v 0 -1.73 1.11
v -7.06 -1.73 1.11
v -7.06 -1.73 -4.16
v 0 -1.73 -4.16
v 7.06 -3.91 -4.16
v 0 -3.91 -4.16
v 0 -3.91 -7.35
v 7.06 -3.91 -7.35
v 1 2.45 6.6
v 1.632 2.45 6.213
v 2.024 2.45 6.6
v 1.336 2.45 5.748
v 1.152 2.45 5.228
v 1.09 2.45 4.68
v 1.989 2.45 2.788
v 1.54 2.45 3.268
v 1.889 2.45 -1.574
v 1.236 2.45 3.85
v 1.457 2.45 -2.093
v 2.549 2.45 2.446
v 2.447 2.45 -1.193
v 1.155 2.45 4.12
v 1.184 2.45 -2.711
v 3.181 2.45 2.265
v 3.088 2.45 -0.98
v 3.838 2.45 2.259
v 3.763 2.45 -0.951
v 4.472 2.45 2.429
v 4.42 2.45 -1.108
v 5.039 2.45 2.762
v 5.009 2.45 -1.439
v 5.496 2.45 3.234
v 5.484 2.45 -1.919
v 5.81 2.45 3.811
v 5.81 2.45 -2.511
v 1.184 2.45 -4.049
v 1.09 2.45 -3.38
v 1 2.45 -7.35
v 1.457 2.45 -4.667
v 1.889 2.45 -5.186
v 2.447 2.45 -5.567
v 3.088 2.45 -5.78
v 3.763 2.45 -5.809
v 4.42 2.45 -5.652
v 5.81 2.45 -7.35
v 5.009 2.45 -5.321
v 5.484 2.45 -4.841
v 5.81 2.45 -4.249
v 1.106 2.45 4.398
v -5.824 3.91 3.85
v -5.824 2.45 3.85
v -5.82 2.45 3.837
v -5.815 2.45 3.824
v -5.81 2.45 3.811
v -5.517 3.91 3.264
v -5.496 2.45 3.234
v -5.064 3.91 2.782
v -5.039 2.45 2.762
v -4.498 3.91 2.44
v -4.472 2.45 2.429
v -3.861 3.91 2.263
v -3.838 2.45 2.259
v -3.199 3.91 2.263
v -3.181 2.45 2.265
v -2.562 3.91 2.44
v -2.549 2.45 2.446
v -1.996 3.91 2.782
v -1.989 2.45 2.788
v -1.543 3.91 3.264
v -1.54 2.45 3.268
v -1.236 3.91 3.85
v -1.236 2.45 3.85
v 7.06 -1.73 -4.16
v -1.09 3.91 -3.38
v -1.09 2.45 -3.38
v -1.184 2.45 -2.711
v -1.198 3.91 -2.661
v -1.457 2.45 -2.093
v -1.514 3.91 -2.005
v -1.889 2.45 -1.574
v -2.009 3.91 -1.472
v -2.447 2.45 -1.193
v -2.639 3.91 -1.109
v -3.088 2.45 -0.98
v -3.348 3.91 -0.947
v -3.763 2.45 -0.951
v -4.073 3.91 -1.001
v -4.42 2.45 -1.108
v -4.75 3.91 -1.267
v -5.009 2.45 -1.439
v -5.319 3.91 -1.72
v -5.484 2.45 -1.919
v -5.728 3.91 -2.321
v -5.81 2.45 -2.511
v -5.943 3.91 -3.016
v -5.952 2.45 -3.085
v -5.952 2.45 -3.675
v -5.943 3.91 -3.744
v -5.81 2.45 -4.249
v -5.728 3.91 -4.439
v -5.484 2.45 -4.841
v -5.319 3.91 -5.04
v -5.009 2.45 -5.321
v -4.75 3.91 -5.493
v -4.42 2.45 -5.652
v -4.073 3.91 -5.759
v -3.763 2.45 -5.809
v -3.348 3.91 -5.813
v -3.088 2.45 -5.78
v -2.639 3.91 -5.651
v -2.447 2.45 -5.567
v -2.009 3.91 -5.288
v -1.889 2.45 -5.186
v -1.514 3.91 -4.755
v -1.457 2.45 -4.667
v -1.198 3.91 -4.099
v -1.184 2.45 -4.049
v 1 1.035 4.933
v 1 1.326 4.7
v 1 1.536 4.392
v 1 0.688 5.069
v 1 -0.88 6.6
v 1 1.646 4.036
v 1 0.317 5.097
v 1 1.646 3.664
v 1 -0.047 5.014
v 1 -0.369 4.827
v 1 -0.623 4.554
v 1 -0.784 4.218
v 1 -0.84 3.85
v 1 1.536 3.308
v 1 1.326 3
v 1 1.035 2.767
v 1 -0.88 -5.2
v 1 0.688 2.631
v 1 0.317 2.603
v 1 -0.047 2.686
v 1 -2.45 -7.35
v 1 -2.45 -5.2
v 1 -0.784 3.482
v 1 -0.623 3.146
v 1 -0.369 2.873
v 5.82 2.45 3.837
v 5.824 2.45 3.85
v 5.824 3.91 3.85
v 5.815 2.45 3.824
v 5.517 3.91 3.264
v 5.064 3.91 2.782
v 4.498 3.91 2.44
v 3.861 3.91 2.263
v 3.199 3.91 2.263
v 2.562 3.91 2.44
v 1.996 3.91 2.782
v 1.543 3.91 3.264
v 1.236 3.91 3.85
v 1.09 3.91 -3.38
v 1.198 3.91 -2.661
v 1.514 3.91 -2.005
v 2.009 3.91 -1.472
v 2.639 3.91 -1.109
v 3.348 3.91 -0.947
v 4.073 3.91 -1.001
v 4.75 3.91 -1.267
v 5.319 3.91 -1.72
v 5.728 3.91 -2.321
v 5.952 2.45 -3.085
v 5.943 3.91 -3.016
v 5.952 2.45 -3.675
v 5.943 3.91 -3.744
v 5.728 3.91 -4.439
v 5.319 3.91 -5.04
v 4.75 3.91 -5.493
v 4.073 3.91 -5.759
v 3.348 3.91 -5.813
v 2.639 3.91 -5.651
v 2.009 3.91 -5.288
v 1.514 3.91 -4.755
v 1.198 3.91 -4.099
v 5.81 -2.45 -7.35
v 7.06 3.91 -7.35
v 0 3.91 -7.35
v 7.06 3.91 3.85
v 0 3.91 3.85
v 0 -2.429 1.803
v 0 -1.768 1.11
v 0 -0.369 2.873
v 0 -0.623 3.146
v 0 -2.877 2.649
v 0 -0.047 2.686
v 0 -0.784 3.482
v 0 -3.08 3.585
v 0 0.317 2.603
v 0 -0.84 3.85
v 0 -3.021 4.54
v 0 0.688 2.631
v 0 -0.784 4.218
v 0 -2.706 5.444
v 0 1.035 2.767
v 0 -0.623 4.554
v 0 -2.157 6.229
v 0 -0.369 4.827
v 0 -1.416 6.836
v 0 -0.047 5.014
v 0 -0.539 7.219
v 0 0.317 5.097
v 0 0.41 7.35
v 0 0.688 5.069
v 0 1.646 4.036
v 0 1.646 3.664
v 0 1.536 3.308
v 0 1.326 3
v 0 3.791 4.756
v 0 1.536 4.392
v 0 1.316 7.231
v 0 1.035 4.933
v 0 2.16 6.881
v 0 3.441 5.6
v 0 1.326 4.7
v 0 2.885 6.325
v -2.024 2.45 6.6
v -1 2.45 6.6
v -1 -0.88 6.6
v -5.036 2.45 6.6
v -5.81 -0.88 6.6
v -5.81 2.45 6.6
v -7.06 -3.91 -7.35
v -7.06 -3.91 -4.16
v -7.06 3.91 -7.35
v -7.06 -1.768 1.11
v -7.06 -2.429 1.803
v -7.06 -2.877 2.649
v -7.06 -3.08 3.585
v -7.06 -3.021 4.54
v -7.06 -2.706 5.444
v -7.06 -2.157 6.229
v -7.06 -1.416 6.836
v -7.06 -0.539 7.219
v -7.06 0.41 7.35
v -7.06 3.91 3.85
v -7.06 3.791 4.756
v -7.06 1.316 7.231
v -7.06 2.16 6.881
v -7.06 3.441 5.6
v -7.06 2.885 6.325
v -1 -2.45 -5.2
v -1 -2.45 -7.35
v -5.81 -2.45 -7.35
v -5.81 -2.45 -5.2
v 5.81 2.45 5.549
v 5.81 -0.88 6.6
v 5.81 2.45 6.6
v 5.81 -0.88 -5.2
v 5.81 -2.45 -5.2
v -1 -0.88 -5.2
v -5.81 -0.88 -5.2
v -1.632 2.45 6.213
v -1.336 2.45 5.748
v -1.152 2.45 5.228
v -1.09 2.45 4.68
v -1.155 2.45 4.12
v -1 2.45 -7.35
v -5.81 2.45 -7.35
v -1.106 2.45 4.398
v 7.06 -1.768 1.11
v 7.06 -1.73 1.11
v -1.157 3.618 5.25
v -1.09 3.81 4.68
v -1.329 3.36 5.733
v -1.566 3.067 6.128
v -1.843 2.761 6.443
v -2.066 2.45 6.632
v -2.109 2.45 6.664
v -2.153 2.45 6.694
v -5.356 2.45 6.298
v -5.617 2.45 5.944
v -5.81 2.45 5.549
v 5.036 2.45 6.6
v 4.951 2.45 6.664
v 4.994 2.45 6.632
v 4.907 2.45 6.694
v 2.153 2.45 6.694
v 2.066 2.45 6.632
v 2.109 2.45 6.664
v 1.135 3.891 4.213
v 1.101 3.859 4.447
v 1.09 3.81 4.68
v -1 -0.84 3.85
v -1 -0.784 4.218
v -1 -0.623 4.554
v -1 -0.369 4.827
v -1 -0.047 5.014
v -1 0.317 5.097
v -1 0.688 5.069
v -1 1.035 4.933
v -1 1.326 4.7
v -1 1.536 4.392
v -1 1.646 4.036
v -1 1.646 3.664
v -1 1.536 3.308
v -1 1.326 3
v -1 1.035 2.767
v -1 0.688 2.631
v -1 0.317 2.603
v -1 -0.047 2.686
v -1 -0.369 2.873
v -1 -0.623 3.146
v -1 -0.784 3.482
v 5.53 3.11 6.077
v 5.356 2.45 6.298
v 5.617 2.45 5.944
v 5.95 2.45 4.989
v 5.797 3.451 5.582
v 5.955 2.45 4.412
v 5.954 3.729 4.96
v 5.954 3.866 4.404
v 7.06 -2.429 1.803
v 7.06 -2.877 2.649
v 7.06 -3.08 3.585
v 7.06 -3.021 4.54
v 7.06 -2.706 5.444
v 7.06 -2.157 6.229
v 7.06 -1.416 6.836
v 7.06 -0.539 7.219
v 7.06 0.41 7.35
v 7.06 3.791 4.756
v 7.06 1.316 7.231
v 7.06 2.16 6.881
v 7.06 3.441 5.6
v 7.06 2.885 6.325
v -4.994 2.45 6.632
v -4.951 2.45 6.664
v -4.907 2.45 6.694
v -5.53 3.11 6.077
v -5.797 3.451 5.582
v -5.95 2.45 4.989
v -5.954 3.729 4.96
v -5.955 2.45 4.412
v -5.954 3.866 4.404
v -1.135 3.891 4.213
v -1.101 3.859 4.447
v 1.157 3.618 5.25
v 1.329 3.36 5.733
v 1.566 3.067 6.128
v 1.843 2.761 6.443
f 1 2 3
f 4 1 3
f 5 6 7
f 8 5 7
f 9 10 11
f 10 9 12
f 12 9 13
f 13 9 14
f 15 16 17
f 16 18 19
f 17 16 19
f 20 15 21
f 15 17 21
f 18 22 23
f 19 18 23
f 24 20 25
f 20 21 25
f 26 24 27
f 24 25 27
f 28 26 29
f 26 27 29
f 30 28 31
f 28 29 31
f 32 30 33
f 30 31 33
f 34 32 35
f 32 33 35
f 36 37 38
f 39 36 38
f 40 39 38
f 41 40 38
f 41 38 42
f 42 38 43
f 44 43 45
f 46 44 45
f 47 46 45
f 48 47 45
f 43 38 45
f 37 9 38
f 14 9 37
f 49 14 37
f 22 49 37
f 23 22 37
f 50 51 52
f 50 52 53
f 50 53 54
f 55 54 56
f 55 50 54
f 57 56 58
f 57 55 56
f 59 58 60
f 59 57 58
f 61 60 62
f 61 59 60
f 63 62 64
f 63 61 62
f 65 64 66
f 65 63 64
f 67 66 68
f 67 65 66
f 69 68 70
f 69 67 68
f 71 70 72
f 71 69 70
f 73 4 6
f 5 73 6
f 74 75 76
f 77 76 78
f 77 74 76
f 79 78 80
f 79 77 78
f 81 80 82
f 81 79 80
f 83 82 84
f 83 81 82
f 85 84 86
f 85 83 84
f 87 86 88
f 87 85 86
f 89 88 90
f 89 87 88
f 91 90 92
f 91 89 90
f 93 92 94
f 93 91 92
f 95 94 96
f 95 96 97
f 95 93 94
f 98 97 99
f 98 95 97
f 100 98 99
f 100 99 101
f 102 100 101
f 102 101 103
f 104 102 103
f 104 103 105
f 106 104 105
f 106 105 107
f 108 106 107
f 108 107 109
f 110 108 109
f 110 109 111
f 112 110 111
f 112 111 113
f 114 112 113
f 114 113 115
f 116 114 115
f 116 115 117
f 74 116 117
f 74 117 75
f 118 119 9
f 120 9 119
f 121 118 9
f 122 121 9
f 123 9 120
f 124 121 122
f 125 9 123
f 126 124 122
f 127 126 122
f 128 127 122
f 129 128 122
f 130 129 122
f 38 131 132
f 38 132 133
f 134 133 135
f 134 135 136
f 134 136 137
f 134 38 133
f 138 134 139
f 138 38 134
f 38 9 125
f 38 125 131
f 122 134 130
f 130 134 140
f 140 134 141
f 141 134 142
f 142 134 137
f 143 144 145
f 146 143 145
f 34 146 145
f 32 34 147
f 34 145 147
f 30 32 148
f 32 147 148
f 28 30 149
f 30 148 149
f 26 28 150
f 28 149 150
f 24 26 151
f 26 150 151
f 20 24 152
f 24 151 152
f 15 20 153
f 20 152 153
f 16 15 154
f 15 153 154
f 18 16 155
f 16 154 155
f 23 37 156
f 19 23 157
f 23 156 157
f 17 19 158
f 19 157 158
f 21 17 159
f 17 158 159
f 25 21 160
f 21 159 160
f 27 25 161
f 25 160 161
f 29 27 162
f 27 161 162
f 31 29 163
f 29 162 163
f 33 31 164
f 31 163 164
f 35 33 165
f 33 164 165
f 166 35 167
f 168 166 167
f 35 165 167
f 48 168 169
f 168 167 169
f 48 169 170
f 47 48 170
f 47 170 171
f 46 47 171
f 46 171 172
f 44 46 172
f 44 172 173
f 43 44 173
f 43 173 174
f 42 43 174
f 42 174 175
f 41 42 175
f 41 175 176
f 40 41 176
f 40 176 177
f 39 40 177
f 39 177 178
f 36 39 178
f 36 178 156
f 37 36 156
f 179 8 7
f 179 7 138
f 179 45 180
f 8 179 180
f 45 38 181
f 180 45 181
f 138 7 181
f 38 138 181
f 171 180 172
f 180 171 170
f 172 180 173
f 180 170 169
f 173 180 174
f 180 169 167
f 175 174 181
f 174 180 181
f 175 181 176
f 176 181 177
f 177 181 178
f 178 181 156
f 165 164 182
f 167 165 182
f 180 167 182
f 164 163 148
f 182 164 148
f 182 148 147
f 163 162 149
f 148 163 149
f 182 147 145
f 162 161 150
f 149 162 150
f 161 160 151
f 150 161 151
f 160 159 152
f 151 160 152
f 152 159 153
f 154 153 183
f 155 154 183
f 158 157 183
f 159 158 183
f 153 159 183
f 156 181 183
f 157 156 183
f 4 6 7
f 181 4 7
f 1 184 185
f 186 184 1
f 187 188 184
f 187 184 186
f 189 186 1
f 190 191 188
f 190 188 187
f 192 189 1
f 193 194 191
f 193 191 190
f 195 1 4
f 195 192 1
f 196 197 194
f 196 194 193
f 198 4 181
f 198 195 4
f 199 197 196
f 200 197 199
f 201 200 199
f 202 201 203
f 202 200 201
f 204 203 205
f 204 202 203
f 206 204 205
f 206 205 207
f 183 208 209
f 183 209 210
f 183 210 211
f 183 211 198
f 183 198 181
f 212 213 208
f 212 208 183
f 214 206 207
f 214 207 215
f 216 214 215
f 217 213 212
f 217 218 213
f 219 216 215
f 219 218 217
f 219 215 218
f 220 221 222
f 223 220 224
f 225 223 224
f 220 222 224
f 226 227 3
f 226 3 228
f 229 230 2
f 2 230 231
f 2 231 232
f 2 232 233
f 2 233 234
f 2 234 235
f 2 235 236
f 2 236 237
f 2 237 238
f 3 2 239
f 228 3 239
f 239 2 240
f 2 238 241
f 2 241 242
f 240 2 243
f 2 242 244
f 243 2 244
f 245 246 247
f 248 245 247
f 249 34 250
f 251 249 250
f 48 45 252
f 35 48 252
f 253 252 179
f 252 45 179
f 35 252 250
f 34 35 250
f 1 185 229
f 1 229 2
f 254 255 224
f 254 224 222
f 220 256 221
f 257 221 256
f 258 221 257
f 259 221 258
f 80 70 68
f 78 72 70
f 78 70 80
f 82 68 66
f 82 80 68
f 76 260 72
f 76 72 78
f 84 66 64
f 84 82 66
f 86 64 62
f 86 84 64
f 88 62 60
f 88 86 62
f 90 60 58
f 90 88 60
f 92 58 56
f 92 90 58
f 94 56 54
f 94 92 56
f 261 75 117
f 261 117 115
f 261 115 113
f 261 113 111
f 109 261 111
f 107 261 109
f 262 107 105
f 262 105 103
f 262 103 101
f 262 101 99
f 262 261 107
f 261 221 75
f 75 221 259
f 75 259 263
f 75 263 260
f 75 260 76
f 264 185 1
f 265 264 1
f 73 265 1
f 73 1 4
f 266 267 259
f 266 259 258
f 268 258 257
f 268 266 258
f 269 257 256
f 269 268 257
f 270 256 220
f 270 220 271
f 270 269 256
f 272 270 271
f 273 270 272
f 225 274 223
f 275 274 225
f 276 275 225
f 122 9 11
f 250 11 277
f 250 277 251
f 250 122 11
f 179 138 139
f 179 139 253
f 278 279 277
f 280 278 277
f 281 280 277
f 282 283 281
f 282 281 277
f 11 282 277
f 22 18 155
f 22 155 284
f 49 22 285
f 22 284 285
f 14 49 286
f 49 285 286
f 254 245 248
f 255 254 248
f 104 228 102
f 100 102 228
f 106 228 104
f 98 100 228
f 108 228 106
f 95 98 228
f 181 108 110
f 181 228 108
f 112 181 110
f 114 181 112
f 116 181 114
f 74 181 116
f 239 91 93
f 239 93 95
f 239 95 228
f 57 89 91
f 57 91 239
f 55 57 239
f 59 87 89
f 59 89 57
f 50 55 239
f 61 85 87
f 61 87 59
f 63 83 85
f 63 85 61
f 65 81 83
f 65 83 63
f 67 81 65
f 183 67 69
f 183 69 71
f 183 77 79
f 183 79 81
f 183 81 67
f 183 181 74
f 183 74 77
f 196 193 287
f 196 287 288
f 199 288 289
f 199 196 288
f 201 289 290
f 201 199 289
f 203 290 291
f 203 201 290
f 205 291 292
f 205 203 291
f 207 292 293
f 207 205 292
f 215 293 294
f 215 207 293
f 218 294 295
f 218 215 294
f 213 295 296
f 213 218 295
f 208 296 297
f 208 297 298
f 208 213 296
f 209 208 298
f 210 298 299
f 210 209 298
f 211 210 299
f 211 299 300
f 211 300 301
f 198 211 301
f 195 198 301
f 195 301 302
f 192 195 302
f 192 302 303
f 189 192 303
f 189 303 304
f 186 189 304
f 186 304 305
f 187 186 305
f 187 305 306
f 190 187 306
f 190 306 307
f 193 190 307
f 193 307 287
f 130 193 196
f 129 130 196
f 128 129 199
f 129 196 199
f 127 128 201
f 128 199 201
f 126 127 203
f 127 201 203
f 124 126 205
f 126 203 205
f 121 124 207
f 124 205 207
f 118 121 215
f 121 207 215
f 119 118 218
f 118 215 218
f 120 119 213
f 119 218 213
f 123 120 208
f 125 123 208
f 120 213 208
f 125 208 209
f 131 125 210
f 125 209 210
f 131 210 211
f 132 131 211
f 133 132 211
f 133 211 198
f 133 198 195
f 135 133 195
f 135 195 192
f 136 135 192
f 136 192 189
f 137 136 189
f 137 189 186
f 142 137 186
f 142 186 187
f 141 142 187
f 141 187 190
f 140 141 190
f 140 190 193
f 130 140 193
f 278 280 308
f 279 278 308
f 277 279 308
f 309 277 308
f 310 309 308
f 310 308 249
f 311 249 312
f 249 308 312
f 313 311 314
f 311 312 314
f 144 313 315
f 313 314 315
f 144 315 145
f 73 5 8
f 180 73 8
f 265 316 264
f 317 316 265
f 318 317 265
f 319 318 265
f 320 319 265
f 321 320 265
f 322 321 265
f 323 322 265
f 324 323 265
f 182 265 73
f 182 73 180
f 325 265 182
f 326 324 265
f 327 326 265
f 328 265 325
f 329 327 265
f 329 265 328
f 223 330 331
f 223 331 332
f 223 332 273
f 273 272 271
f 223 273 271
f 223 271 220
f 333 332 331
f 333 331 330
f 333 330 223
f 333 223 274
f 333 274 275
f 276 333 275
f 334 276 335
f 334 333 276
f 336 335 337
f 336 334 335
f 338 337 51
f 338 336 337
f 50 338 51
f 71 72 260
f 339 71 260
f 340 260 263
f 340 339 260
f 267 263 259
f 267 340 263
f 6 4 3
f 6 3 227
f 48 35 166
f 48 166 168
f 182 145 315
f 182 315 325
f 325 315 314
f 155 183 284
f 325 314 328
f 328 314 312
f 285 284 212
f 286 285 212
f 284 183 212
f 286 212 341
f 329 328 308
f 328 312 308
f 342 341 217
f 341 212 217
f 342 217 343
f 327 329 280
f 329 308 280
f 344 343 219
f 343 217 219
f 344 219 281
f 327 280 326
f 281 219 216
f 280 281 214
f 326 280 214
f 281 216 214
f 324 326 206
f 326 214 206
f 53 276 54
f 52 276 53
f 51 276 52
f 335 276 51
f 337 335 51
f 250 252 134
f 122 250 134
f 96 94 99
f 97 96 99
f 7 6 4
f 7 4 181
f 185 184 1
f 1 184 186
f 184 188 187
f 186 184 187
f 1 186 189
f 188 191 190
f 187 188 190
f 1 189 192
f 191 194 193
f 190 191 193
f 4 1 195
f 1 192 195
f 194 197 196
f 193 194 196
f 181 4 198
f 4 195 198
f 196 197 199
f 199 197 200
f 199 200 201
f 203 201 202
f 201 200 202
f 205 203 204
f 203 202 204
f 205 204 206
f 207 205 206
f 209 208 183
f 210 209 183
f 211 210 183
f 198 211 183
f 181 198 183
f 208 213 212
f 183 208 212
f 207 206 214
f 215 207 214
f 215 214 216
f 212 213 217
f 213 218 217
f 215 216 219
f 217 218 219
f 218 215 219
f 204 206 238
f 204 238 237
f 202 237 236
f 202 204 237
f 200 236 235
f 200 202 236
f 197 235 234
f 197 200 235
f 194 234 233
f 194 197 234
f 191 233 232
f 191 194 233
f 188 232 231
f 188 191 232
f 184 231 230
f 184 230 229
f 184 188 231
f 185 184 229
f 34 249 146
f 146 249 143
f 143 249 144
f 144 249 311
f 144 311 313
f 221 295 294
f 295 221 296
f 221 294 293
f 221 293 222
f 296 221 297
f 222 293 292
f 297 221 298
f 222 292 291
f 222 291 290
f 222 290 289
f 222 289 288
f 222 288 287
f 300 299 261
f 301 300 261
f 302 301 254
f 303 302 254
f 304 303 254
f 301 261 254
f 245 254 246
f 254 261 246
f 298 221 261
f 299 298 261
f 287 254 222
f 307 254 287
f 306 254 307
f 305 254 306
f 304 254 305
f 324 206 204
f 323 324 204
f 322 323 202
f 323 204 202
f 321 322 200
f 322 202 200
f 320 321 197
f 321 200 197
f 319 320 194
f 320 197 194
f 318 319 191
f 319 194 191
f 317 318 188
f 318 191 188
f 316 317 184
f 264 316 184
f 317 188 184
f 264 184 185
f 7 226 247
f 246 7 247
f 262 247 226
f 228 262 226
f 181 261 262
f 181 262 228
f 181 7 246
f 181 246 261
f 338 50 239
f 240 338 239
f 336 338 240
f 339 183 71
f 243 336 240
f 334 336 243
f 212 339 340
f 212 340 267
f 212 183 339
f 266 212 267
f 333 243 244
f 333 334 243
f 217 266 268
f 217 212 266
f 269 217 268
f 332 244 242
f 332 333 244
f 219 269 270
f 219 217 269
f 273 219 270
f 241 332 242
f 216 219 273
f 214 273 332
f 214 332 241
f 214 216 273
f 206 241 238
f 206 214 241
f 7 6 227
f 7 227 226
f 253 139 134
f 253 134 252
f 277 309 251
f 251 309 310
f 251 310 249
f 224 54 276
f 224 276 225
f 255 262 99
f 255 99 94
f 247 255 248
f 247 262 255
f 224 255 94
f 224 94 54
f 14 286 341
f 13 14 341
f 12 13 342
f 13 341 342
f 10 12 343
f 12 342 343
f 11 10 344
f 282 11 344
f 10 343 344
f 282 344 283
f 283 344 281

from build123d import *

# Parameters (mm, degrees)
F1_DEPTH = 7.06
F2_W     = 4.81
F2_H     = 4.9
F3_DEPTH = 2.15
F4_R     = 2.44
F5_DEPTH = 1.46
F7_DEPTH = 11.8
F8_R     = 1.25
F9_DEPTH = 1.25


with BuildPart() as f1:
    # F0 (on Right) → F1 (new body)
    with BuildSketch(Plane.YZ):
        with BuildLine():
            ThreePointArc((3.91, 3.85), (2.884874, 6.324874), (0.41, 7.35))
            ThreePointArc((0.41, 7.35), (-2.894542, 5.003256), (-1.767705, 1.11))
            Line((-1.767705, 1.11), (-1.73, 1.11))
            Line((-1.73, 1.11), (-1.73, 1.080451))
            ThreePointArc((-1.73, 1.080451), (1.952725, 0.708344), (3.91, 3.85))
        make_face()
        with BuildLine():
            Line((3.91, -7.35), (3.91, 3.85))
            ThreePointArc((3.91, 3.85), (1.952725, 0.708344), (-1.73, 1.080451))
            Line((-1.73, 1.080451), (-1.73, -4.16))
            Line((-1.73, -4.16), (-3.91, -4.16))
            Line((-3.91, -4.16), (-3.91, -7.35))
            Line((-3.91, -7.35), (3.91, -7.35))
        make_face()
    extrude(amount=F1_DEPTH)

    # F2 (on face) → F3 (cut)
    with BuildSketch(Plane(origin=(0, 0, -7.35), x_dir=(1, 0, 0), z_dir=(0, 0, -1))):
        with Locations((3.405, 0)):
            Rectangle(F2_W, F2_H)
    extrude(amount=-F3_DEPTH, mode=Mode.SUBTRACT)

    # F4 (on face) → F5 (cut)
    with BuildSketch(Plane(origin=(0, 3.91, 0), x_dir=(-1, 0, 0), z_dir=(0, 1, 0))):
        with Locations((-3.53, -3.38)):
            Circle(F4_R)
        with BuildLine():
            Line((-1.235507, 3.85), (-5.824493, 3.85))
            ThreePointArc((-5.824493, 3.85), (-3.53, 2.24), (-1.235507, 3.85))
        make_face()
        with BuildLine():
            ThreePointArc((-1.235507, 3.85), (-1.126652, 4.258671), (-1.09, 4.68))
            ThreePointArc((-1.09, 4.68), (-3.951329, 7.083348), (-5.824493, 3.85))
            Line((-5.824493, 3.85), (-1.235507, 3.85))
        make_face()
    extrude(amount=-F5_DEPTH, mode=Mode.SUBTRACT)

    # F6 (on face) → F7 (cut)
    with BuildSketch(Plane(origin=(0, 0, -5.2), x_dir=(1, 0, 0), z_dir=(0, 0, -1))):
        Polygon((1, 0.88), (1, -2.45), (1.904823, -2.45), (5.155177, -2.45), (5.81, -2.45), (5.81, 0.88), align=None)
    extrude(amount=-F7_DEPTH, mode=Mode.SUBTRACT)

    # F8 (on face) → F9 (cut)
    with BuildSketch(Plane(origin=(0, 0, 0), x_dir=(0, -1, 0), z_dir=(-1, 0, 0))):
        with Locations((-0.41, 3.85)):
            Circle(F8_R)
    extrude(amount=-F9_DEPTH, mode=Mode.SUBTRACT)


with BuildPart() as f10_1:
    # F10: instance of F1
    add(f1.part.mirror(Plane.YZ))


solid = Compound([f1.part, f10_1.part])
